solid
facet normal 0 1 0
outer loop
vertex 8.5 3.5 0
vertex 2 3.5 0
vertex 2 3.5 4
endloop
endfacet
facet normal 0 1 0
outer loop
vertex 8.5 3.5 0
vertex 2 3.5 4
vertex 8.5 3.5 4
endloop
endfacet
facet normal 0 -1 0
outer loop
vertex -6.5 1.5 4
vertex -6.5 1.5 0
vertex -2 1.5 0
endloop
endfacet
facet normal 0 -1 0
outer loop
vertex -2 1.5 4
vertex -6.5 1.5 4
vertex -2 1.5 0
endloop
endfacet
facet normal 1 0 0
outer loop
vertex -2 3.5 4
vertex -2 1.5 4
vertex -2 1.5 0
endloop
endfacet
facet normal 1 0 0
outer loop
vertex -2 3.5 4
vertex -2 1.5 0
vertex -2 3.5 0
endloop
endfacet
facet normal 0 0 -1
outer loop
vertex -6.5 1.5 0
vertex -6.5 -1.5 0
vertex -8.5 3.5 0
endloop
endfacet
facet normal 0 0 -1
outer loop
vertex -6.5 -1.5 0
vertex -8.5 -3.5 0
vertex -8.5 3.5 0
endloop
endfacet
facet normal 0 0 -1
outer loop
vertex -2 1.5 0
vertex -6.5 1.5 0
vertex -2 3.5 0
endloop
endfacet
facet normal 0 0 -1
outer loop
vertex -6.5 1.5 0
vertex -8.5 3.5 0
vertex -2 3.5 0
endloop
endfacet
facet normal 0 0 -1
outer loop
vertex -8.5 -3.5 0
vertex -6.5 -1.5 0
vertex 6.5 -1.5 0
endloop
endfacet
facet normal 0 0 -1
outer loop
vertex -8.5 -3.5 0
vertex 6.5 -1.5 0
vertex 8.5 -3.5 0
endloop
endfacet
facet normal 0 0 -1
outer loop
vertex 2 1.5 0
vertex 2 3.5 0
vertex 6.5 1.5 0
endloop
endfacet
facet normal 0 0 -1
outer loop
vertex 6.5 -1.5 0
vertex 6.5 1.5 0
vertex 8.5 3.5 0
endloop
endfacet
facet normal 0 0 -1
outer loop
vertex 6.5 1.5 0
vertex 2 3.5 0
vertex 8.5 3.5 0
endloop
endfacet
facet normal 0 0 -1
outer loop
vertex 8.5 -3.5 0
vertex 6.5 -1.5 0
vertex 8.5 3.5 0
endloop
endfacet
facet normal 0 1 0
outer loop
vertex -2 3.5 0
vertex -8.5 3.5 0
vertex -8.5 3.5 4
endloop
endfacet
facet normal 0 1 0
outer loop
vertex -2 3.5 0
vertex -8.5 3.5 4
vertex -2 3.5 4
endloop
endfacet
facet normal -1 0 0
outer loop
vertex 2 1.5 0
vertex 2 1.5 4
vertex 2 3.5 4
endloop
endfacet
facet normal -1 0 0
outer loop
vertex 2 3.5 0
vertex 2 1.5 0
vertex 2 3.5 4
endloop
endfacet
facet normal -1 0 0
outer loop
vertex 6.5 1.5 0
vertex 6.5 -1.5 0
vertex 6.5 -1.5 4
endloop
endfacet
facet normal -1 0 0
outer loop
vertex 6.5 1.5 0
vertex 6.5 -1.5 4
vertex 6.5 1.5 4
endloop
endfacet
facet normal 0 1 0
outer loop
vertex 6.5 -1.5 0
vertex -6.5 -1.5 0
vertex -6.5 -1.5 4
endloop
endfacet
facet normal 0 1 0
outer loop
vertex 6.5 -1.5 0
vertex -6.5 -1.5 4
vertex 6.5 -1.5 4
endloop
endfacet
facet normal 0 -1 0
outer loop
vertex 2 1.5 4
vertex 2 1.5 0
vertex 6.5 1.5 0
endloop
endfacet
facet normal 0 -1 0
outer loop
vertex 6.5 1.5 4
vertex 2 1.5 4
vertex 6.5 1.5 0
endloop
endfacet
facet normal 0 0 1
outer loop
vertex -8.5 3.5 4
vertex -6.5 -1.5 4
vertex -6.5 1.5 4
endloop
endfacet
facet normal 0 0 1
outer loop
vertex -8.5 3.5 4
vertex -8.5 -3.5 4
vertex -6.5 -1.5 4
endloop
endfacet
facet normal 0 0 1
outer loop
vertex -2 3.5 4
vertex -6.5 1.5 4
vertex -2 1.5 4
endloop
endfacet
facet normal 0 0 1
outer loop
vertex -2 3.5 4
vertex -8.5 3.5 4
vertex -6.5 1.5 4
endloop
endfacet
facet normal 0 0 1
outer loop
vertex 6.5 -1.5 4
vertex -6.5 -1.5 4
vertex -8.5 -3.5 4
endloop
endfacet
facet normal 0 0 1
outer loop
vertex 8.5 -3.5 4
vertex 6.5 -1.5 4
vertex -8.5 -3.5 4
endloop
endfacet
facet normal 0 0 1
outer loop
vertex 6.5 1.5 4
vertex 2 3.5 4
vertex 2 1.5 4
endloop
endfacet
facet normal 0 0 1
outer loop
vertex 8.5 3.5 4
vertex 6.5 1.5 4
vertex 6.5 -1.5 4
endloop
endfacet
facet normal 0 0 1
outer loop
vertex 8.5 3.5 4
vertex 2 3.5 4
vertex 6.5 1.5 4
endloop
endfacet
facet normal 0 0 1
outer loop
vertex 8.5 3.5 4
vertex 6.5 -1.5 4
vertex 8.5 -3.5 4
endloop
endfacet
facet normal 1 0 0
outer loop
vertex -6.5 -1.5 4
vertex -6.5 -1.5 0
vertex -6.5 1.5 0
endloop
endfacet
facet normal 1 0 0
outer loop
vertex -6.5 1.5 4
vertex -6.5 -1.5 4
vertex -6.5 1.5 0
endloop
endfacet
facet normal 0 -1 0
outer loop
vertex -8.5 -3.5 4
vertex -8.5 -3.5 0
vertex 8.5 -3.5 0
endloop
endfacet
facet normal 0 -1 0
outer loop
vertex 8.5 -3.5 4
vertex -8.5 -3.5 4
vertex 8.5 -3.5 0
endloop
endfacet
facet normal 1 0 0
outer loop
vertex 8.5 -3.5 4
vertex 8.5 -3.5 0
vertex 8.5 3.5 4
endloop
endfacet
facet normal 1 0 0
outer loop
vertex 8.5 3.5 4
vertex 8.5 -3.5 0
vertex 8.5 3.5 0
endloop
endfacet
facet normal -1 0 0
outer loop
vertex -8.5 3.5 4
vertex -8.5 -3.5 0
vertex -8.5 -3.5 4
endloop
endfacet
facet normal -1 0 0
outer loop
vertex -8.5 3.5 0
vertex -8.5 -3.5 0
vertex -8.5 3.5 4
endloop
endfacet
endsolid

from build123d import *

# Parameters (mm, degrees)
F0_W     = 17
F0_H     = 7
F0_W_2   = 13
F0_H_2   = 3
F1_DEPTH = 4
F2_W     = 4
F2_H     = 2
F3_DEPTH = 25


with BuildPart() as f1:
    # F0 (on Top) → F1 (new body)
    with BuildSketch(Plane.XY):
        Rectangle(F0_W, F0_H)
        Rectangle(F0_W_2, F0_H_2, mode=Mode.SUBTRACT)
    extrude(amount=F1_DEPTH)

    # F2 (on face) → F3 (cut)
    with BuildSketch(Plane.XY.offset(4)):
        with Locations((0, 2.5)):
            Rectangle(F2_W, F2_H)
    extrude(amount=-F3_DEPTH, mode=Mode.SUBTRACT)


solid = f1.part
